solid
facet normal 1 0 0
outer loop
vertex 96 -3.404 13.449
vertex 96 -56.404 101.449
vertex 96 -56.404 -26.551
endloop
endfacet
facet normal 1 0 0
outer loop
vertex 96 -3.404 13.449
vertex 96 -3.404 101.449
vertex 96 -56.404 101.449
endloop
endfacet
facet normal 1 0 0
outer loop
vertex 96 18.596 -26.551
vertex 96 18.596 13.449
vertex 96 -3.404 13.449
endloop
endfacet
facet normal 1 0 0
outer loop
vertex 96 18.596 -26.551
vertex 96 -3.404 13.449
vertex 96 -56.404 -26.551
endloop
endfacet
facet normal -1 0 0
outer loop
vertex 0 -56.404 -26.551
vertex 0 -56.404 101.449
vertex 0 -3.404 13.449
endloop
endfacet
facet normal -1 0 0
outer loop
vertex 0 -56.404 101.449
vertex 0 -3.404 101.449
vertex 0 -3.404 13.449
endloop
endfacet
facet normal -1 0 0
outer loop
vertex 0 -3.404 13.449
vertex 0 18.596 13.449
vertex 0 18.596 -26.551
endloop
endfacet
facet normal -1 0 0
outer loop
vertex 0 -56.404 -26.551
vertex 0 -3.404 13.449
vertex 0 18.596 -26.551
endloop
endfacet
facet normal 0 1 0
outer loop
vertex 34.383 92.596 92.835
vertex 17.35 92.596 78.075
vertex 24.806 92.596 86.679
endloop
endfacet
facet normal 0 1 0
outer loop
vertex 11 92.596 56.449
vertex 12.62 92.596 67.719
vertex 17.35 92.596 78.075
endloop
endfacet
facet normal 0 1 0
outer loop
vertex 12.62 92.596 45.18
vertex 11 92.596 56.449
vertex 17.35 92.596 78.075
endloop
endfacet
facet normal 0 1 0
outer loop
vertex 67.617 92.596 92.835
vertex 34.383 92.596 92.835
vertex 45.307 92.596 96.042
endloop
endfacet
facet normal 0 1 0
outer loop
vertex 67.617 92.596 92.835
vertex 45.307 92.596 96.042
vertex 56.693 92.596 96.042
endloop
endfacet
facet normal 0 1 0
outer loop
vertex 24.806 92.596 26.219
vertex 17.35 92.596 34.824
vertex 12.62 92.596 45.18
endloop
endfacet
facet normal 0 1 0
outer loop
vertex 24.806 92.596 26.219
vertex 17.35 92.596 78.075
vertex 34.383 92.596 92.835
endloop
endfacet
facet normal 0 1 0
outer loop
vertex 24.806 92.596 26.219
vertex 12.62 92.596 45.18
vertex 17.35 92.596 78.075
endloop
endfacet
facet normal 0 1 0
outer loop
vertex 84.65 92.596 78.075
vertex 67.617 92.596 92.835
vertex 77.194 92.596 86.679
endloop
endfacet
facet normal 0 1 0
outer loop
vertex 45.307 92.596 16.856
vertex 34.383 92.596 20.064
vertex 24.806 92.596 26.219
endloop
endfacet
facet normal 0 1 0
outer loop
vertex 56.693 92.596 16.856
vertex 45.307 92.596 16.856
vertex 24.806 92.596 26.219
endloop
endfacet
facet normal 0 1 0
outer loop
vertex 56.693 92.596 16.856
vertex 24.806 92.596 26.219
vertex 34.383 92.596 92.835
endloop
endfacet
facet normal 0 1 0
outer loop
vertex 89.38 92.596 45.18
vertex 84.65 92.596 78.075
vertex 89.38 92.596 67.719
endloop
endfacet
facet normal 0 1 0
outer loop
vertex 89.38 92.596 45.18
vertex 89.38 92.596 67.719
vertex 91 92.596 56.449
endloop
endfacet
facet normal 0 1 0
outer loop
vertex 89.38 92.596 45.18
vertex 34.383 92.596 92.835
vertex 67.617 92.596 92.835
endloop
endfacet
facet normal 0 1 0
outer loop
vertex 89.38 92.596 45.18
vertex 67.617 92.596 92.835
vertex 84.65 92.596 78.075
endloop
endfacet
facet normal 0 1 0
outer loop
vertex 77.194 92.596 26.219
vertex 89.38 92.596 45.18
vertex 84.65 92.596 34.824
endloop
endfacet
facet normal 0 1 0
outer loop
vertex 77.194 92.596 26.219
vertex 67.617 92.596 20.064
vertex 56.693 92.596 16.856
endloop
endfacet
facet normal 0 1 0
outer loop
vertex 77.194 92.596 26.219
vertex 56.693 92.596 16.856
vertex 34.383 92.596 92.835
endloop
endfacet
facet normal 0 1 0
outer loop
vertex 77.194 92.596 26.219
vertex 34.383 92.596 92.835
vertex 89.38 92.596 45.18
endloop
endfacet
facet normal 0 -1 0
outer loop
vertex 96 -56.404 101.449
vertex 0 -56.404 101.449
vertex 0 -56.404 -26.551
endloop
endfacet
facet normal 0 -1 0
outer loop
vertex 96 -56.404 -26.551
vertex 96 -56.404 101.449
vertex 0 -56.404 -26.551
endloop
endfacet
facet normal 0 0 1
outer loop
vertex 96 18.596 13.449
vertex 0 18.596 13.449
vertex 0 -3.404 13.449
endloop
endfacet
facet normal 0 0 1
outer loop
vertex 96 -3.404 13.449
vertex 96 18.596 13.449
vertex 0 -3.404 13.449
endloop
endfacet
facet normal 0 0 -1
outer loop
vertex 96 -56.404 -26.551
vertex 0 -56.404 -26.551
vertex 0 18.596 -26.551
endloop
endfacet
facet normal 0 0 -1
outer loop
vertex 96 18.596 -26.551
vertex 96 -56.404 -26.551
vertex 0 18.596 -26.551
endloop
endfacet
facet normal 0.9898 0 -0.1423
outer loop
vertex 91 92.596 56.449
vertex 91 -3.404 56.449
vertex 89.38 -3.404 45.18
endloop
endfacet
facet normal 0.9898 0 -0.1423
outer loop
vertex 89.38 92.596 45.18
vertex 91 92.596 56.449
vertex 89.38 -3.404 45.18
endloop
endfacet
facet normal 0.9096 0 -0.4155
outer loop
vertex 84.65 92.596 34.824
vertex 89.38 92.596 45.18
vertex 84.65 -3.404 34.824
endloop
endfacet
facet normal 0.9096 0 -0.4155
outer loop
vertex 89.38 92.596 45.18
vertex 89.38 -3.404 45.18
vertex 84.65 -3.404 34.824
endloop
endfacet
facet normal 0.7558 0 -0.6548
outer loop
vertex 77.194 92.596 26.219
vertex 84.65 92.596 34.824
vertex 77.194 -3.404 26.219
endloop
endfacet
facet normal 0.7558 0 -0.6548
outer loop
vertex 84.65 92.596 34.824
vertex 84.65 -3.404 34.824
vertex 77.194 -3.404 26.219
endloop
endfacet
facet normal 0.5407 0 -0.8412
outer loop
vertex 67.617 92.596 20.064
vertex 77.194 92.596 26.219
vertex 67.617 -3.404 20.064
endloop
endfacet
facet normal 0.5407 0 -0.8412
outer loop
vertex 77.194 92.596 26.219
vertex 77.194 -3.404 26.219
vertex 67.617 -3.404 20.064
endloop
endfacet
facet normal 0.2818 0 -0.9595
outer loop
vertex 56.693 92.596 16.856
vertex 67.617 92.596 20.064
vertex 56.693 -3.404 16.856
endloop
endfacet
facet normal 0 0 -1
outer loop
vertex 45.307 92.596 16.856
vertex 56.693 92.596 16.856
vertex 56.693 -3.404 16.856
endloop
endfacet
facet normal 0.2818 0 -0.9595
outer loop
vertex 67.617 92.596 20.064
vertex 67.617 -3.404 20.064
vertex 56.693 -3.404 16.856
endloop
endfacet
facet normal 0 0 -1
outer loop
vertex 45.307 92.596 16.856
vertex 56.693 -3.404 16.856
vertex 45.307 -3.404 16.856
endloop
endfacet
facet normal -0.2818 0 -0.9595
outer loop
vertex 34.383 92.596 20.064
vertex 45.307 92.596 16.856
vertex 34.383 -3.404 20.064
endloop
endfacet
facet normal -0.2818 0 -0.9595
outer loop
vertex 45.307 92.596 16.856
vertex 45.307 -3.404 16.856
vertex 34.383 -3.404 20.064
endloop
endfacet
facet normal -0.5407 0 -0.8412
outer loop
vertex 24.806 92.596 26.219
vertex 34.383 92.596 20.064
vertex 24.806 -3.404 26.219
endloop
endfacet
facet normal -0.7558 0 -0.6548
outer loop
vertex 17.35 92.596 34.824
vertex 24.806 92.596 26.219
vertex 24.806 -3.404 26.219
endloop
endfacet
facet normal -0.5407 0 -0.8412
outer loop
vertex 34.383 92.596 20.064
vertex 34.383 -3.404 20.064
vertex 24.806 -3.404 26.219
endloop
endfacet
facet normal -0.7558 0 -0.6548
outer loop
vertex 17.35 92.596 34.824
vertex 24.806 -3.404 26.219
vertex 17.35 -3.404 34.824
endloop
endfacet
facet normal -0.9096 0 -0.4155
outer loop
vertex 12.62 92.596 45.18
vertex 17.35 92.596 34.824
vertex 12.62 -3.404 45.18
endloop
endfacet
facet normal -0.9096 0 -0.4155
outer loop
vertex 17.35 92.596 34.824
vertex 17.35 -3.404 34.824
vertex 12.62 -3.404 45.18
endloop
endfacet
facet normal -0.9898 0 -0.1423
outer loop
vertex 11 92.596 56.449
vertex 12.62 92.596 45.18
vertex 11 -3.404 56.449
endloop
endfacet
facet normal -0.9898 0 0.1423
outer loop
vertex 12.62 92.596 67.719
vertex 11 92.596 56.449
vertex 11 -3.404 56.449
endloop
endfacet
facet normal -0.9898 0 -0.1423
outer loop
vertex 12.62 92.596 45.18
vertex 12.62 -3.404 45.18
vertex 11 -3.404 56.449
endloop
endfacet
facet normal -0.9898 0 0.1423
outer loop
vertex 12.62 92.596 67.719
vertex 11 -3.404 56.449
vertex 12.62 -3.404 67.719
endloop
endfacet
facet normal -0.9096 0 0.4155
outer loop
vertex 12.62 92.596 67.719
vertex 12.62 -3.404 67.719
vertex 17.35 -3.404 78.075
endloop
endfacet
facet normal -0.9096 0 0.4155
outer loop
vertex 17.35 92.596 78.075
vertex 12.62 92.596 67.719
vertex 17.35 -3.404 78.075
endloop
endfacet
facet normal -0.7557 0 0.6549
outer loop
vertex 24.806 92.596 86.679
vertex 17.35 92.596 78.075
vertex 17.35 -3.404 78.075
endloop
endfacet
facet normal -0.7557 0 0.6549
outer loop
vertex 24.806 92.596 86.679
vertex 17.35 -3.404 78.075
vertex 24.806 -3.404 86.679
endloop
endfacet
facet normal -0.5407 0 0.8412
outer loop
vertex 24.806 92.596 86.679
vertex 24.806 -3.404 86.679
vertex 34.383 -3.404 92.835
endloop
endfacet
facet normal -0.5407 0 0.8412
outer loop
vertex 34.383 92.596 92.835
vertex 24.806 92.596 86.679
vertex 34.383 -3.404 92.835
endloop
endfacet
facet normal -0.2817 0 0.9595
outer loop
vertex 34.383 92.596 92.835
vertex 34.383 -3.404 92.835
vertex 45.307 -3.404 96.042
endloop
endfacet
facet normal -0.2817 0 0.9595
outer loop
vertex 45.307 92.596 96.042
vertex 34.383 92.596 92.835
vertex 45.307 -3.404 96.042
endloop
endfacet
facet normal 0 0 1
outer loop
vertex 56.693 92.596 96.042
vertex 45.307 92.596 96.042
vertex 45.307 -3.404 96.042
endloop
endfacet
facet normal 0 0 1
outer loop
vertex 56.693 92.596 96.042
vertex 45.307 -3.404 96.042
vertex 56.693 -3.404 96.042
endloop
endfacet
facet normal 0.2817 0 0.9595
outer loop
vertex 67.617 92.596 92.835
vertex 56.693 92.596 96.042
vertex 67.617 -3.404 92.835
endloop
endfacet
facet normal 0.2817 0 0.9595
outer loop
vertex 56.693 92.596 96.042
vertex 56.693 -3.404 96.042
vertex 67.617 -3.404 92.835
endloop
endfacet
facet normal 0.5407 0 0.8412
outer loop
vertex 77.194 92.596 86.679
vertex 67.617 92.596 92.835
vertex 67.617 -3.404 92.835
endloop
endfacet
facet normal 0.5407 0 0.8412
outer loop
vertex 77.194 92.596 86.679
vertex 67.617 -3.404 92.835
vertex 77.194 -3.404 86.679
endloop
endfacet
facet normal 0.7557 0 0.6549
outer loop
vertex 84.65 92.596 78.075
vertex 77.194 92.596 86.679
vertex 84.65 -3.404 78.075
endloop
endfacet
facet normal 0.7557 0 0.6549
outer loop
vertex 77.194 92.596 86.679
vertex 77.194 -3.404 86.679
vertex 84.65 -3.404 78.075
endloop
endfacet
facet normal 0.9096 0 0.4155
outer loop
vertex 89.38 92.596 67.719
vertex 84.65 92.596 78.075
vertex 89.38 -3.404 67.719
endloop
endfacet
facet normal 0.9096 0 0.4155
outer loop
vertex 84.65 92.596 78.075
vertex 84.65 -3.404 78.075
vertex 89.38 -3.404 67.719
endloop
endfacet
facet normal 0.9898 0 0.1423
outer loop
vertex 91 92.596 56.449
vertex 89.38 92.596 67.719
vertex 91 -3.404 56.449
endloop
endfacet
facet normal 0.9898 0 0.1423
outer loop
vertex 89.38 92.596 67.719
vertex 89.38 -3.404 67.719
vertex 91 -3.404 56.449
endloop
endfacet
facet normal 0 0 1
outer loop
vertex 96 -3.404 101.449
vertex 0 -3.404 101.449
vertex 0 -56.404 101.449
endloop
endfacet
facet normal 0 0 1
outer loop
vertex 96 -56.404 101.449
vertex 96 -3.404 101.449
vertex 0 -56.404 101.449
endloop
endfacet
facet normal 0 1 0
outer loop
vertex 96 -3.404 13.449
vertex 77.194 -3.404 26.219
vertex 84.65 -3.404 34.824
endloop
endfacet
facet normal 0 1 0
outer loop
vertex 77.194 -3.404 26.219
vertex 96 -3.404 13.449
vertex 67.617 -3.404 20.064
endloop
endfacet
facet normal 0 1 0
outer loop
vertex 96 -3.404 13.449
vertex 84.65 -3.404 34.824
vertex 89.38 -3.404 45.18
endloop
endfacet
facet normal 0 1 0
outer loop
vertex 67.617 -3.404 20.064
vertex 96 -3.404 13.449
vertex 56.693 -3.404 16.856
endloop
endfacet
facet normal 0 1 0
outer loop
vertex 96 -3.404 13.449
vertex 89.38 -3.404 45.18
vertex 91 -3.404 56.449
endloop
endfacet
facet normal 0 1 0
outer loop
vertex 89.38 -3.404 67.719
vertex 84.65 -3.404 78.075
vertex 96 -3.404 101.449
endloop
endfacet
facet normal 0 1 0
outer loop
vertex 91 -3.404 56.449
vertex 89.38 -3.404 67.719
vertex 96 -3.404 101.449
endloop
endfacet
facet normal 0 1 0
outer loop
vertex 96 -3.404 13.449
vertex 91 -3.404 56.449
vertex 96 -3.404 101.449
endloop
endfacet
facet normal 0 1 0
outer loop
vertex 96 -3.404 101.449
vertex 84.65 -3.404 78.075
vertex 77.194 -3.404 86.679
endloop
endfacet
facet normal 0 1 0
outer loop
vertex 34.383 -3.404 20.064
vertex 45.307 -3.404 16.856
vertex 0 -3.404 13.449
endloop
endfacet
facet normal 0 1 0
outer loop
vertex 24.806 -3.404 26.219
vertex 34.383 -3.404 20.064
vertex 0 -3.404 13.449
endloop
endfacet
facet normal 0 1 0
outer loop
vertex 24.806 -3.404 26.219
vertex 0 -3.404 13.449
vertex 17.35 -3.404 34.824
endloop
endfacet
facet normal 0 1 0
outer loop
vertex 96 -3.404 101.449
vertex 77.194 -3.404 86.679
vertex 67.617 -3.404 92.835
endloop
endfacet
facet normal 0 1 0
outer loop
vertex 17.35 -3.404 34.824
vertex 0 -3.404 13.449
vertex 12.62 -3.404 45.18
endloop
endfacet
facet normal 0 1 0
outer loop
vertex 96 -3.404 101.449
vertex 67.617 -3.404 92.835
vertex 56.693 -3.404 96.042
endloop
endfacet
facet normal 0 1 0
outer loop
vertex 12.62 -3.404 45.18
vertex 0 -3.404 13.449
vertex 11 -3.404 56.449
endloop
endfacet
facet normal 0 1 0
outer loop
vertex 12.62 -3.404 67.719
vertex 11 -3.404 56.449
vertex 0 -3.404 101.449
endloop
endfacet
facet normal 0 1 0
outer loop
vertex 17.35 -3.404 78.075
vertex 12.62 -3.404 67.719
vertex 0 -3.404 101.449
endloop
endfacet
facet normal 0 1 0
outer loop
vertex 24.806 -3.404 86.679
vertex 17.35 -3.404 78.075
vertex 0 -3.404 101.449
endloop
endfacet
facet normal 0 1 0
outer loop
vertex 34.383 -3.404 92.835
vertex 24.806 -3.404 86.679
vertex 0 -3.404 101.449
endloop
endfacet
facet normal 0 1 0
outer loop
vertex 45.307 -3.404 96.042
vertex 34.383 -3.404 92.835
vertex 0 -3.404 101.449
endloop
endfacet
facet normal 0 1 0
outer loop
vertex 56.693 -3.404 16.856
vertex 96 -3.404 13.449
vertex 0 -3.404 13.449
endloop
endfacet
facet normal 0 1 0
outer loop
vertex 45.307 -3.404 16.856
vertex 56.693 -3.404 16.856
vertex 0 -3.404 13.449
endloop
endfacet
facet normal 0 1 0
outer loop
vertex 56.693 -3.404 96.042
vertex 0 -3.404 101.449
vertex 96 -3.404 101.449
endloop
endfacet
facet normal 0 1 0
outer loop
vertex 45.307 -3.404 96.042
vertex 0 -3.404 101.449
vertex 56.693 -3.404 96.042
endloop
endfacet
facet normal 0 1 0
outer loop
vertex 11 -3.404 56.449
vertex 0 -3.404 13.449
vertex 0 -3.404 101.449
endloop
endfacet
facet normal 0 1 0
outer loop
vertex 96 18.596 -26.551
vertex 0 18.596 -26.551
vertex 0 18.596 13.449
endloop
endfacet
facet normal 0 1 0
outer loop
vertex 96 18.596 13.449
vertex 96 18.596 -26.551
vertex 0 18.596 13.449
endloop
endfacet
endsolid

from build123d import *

# Parameters (mm, degrees)
BOSS_EXTRUDE1_DEPTH = 96
SKETCH2_R           = 40
BOSS_EXTRUDE2_DEPTH = 96


with BuildPart() as part:
    # Sketch1 → Boss-Extrude1 (new body)
    with BuildSketch(Plane(origin=(0, 0, 0), x_dir=(0, 0, -1), z_dir=(1, 0, 0))):
        Polygon((-101.449299301, -56.403624436), (26.550700699, -56.403624436), (26.550700699, -3.403624436), (26.550700699, 18.596375564), (-13.449299301, 18.596375564), (-13.449299301, -3.403624436), (-101.449299301, -3.403624436), align=None)
    extrude(amount=BOSS_EXTRUDE1_DEPTH)

    # Sketch2 → Boss-Extrude2 (add)
    with BuildSketch(Plane(origin=(0, -3.403624436, 0), x_dir=(1, 0, 0), z_dir=(0, 1, 0))):
        with Locations((51, -56.449299301)):
            Circle(SKETCH2_R)
    extrude(amount=BOSS_EXTRUDE2_DEPTH)


solid = part.part
